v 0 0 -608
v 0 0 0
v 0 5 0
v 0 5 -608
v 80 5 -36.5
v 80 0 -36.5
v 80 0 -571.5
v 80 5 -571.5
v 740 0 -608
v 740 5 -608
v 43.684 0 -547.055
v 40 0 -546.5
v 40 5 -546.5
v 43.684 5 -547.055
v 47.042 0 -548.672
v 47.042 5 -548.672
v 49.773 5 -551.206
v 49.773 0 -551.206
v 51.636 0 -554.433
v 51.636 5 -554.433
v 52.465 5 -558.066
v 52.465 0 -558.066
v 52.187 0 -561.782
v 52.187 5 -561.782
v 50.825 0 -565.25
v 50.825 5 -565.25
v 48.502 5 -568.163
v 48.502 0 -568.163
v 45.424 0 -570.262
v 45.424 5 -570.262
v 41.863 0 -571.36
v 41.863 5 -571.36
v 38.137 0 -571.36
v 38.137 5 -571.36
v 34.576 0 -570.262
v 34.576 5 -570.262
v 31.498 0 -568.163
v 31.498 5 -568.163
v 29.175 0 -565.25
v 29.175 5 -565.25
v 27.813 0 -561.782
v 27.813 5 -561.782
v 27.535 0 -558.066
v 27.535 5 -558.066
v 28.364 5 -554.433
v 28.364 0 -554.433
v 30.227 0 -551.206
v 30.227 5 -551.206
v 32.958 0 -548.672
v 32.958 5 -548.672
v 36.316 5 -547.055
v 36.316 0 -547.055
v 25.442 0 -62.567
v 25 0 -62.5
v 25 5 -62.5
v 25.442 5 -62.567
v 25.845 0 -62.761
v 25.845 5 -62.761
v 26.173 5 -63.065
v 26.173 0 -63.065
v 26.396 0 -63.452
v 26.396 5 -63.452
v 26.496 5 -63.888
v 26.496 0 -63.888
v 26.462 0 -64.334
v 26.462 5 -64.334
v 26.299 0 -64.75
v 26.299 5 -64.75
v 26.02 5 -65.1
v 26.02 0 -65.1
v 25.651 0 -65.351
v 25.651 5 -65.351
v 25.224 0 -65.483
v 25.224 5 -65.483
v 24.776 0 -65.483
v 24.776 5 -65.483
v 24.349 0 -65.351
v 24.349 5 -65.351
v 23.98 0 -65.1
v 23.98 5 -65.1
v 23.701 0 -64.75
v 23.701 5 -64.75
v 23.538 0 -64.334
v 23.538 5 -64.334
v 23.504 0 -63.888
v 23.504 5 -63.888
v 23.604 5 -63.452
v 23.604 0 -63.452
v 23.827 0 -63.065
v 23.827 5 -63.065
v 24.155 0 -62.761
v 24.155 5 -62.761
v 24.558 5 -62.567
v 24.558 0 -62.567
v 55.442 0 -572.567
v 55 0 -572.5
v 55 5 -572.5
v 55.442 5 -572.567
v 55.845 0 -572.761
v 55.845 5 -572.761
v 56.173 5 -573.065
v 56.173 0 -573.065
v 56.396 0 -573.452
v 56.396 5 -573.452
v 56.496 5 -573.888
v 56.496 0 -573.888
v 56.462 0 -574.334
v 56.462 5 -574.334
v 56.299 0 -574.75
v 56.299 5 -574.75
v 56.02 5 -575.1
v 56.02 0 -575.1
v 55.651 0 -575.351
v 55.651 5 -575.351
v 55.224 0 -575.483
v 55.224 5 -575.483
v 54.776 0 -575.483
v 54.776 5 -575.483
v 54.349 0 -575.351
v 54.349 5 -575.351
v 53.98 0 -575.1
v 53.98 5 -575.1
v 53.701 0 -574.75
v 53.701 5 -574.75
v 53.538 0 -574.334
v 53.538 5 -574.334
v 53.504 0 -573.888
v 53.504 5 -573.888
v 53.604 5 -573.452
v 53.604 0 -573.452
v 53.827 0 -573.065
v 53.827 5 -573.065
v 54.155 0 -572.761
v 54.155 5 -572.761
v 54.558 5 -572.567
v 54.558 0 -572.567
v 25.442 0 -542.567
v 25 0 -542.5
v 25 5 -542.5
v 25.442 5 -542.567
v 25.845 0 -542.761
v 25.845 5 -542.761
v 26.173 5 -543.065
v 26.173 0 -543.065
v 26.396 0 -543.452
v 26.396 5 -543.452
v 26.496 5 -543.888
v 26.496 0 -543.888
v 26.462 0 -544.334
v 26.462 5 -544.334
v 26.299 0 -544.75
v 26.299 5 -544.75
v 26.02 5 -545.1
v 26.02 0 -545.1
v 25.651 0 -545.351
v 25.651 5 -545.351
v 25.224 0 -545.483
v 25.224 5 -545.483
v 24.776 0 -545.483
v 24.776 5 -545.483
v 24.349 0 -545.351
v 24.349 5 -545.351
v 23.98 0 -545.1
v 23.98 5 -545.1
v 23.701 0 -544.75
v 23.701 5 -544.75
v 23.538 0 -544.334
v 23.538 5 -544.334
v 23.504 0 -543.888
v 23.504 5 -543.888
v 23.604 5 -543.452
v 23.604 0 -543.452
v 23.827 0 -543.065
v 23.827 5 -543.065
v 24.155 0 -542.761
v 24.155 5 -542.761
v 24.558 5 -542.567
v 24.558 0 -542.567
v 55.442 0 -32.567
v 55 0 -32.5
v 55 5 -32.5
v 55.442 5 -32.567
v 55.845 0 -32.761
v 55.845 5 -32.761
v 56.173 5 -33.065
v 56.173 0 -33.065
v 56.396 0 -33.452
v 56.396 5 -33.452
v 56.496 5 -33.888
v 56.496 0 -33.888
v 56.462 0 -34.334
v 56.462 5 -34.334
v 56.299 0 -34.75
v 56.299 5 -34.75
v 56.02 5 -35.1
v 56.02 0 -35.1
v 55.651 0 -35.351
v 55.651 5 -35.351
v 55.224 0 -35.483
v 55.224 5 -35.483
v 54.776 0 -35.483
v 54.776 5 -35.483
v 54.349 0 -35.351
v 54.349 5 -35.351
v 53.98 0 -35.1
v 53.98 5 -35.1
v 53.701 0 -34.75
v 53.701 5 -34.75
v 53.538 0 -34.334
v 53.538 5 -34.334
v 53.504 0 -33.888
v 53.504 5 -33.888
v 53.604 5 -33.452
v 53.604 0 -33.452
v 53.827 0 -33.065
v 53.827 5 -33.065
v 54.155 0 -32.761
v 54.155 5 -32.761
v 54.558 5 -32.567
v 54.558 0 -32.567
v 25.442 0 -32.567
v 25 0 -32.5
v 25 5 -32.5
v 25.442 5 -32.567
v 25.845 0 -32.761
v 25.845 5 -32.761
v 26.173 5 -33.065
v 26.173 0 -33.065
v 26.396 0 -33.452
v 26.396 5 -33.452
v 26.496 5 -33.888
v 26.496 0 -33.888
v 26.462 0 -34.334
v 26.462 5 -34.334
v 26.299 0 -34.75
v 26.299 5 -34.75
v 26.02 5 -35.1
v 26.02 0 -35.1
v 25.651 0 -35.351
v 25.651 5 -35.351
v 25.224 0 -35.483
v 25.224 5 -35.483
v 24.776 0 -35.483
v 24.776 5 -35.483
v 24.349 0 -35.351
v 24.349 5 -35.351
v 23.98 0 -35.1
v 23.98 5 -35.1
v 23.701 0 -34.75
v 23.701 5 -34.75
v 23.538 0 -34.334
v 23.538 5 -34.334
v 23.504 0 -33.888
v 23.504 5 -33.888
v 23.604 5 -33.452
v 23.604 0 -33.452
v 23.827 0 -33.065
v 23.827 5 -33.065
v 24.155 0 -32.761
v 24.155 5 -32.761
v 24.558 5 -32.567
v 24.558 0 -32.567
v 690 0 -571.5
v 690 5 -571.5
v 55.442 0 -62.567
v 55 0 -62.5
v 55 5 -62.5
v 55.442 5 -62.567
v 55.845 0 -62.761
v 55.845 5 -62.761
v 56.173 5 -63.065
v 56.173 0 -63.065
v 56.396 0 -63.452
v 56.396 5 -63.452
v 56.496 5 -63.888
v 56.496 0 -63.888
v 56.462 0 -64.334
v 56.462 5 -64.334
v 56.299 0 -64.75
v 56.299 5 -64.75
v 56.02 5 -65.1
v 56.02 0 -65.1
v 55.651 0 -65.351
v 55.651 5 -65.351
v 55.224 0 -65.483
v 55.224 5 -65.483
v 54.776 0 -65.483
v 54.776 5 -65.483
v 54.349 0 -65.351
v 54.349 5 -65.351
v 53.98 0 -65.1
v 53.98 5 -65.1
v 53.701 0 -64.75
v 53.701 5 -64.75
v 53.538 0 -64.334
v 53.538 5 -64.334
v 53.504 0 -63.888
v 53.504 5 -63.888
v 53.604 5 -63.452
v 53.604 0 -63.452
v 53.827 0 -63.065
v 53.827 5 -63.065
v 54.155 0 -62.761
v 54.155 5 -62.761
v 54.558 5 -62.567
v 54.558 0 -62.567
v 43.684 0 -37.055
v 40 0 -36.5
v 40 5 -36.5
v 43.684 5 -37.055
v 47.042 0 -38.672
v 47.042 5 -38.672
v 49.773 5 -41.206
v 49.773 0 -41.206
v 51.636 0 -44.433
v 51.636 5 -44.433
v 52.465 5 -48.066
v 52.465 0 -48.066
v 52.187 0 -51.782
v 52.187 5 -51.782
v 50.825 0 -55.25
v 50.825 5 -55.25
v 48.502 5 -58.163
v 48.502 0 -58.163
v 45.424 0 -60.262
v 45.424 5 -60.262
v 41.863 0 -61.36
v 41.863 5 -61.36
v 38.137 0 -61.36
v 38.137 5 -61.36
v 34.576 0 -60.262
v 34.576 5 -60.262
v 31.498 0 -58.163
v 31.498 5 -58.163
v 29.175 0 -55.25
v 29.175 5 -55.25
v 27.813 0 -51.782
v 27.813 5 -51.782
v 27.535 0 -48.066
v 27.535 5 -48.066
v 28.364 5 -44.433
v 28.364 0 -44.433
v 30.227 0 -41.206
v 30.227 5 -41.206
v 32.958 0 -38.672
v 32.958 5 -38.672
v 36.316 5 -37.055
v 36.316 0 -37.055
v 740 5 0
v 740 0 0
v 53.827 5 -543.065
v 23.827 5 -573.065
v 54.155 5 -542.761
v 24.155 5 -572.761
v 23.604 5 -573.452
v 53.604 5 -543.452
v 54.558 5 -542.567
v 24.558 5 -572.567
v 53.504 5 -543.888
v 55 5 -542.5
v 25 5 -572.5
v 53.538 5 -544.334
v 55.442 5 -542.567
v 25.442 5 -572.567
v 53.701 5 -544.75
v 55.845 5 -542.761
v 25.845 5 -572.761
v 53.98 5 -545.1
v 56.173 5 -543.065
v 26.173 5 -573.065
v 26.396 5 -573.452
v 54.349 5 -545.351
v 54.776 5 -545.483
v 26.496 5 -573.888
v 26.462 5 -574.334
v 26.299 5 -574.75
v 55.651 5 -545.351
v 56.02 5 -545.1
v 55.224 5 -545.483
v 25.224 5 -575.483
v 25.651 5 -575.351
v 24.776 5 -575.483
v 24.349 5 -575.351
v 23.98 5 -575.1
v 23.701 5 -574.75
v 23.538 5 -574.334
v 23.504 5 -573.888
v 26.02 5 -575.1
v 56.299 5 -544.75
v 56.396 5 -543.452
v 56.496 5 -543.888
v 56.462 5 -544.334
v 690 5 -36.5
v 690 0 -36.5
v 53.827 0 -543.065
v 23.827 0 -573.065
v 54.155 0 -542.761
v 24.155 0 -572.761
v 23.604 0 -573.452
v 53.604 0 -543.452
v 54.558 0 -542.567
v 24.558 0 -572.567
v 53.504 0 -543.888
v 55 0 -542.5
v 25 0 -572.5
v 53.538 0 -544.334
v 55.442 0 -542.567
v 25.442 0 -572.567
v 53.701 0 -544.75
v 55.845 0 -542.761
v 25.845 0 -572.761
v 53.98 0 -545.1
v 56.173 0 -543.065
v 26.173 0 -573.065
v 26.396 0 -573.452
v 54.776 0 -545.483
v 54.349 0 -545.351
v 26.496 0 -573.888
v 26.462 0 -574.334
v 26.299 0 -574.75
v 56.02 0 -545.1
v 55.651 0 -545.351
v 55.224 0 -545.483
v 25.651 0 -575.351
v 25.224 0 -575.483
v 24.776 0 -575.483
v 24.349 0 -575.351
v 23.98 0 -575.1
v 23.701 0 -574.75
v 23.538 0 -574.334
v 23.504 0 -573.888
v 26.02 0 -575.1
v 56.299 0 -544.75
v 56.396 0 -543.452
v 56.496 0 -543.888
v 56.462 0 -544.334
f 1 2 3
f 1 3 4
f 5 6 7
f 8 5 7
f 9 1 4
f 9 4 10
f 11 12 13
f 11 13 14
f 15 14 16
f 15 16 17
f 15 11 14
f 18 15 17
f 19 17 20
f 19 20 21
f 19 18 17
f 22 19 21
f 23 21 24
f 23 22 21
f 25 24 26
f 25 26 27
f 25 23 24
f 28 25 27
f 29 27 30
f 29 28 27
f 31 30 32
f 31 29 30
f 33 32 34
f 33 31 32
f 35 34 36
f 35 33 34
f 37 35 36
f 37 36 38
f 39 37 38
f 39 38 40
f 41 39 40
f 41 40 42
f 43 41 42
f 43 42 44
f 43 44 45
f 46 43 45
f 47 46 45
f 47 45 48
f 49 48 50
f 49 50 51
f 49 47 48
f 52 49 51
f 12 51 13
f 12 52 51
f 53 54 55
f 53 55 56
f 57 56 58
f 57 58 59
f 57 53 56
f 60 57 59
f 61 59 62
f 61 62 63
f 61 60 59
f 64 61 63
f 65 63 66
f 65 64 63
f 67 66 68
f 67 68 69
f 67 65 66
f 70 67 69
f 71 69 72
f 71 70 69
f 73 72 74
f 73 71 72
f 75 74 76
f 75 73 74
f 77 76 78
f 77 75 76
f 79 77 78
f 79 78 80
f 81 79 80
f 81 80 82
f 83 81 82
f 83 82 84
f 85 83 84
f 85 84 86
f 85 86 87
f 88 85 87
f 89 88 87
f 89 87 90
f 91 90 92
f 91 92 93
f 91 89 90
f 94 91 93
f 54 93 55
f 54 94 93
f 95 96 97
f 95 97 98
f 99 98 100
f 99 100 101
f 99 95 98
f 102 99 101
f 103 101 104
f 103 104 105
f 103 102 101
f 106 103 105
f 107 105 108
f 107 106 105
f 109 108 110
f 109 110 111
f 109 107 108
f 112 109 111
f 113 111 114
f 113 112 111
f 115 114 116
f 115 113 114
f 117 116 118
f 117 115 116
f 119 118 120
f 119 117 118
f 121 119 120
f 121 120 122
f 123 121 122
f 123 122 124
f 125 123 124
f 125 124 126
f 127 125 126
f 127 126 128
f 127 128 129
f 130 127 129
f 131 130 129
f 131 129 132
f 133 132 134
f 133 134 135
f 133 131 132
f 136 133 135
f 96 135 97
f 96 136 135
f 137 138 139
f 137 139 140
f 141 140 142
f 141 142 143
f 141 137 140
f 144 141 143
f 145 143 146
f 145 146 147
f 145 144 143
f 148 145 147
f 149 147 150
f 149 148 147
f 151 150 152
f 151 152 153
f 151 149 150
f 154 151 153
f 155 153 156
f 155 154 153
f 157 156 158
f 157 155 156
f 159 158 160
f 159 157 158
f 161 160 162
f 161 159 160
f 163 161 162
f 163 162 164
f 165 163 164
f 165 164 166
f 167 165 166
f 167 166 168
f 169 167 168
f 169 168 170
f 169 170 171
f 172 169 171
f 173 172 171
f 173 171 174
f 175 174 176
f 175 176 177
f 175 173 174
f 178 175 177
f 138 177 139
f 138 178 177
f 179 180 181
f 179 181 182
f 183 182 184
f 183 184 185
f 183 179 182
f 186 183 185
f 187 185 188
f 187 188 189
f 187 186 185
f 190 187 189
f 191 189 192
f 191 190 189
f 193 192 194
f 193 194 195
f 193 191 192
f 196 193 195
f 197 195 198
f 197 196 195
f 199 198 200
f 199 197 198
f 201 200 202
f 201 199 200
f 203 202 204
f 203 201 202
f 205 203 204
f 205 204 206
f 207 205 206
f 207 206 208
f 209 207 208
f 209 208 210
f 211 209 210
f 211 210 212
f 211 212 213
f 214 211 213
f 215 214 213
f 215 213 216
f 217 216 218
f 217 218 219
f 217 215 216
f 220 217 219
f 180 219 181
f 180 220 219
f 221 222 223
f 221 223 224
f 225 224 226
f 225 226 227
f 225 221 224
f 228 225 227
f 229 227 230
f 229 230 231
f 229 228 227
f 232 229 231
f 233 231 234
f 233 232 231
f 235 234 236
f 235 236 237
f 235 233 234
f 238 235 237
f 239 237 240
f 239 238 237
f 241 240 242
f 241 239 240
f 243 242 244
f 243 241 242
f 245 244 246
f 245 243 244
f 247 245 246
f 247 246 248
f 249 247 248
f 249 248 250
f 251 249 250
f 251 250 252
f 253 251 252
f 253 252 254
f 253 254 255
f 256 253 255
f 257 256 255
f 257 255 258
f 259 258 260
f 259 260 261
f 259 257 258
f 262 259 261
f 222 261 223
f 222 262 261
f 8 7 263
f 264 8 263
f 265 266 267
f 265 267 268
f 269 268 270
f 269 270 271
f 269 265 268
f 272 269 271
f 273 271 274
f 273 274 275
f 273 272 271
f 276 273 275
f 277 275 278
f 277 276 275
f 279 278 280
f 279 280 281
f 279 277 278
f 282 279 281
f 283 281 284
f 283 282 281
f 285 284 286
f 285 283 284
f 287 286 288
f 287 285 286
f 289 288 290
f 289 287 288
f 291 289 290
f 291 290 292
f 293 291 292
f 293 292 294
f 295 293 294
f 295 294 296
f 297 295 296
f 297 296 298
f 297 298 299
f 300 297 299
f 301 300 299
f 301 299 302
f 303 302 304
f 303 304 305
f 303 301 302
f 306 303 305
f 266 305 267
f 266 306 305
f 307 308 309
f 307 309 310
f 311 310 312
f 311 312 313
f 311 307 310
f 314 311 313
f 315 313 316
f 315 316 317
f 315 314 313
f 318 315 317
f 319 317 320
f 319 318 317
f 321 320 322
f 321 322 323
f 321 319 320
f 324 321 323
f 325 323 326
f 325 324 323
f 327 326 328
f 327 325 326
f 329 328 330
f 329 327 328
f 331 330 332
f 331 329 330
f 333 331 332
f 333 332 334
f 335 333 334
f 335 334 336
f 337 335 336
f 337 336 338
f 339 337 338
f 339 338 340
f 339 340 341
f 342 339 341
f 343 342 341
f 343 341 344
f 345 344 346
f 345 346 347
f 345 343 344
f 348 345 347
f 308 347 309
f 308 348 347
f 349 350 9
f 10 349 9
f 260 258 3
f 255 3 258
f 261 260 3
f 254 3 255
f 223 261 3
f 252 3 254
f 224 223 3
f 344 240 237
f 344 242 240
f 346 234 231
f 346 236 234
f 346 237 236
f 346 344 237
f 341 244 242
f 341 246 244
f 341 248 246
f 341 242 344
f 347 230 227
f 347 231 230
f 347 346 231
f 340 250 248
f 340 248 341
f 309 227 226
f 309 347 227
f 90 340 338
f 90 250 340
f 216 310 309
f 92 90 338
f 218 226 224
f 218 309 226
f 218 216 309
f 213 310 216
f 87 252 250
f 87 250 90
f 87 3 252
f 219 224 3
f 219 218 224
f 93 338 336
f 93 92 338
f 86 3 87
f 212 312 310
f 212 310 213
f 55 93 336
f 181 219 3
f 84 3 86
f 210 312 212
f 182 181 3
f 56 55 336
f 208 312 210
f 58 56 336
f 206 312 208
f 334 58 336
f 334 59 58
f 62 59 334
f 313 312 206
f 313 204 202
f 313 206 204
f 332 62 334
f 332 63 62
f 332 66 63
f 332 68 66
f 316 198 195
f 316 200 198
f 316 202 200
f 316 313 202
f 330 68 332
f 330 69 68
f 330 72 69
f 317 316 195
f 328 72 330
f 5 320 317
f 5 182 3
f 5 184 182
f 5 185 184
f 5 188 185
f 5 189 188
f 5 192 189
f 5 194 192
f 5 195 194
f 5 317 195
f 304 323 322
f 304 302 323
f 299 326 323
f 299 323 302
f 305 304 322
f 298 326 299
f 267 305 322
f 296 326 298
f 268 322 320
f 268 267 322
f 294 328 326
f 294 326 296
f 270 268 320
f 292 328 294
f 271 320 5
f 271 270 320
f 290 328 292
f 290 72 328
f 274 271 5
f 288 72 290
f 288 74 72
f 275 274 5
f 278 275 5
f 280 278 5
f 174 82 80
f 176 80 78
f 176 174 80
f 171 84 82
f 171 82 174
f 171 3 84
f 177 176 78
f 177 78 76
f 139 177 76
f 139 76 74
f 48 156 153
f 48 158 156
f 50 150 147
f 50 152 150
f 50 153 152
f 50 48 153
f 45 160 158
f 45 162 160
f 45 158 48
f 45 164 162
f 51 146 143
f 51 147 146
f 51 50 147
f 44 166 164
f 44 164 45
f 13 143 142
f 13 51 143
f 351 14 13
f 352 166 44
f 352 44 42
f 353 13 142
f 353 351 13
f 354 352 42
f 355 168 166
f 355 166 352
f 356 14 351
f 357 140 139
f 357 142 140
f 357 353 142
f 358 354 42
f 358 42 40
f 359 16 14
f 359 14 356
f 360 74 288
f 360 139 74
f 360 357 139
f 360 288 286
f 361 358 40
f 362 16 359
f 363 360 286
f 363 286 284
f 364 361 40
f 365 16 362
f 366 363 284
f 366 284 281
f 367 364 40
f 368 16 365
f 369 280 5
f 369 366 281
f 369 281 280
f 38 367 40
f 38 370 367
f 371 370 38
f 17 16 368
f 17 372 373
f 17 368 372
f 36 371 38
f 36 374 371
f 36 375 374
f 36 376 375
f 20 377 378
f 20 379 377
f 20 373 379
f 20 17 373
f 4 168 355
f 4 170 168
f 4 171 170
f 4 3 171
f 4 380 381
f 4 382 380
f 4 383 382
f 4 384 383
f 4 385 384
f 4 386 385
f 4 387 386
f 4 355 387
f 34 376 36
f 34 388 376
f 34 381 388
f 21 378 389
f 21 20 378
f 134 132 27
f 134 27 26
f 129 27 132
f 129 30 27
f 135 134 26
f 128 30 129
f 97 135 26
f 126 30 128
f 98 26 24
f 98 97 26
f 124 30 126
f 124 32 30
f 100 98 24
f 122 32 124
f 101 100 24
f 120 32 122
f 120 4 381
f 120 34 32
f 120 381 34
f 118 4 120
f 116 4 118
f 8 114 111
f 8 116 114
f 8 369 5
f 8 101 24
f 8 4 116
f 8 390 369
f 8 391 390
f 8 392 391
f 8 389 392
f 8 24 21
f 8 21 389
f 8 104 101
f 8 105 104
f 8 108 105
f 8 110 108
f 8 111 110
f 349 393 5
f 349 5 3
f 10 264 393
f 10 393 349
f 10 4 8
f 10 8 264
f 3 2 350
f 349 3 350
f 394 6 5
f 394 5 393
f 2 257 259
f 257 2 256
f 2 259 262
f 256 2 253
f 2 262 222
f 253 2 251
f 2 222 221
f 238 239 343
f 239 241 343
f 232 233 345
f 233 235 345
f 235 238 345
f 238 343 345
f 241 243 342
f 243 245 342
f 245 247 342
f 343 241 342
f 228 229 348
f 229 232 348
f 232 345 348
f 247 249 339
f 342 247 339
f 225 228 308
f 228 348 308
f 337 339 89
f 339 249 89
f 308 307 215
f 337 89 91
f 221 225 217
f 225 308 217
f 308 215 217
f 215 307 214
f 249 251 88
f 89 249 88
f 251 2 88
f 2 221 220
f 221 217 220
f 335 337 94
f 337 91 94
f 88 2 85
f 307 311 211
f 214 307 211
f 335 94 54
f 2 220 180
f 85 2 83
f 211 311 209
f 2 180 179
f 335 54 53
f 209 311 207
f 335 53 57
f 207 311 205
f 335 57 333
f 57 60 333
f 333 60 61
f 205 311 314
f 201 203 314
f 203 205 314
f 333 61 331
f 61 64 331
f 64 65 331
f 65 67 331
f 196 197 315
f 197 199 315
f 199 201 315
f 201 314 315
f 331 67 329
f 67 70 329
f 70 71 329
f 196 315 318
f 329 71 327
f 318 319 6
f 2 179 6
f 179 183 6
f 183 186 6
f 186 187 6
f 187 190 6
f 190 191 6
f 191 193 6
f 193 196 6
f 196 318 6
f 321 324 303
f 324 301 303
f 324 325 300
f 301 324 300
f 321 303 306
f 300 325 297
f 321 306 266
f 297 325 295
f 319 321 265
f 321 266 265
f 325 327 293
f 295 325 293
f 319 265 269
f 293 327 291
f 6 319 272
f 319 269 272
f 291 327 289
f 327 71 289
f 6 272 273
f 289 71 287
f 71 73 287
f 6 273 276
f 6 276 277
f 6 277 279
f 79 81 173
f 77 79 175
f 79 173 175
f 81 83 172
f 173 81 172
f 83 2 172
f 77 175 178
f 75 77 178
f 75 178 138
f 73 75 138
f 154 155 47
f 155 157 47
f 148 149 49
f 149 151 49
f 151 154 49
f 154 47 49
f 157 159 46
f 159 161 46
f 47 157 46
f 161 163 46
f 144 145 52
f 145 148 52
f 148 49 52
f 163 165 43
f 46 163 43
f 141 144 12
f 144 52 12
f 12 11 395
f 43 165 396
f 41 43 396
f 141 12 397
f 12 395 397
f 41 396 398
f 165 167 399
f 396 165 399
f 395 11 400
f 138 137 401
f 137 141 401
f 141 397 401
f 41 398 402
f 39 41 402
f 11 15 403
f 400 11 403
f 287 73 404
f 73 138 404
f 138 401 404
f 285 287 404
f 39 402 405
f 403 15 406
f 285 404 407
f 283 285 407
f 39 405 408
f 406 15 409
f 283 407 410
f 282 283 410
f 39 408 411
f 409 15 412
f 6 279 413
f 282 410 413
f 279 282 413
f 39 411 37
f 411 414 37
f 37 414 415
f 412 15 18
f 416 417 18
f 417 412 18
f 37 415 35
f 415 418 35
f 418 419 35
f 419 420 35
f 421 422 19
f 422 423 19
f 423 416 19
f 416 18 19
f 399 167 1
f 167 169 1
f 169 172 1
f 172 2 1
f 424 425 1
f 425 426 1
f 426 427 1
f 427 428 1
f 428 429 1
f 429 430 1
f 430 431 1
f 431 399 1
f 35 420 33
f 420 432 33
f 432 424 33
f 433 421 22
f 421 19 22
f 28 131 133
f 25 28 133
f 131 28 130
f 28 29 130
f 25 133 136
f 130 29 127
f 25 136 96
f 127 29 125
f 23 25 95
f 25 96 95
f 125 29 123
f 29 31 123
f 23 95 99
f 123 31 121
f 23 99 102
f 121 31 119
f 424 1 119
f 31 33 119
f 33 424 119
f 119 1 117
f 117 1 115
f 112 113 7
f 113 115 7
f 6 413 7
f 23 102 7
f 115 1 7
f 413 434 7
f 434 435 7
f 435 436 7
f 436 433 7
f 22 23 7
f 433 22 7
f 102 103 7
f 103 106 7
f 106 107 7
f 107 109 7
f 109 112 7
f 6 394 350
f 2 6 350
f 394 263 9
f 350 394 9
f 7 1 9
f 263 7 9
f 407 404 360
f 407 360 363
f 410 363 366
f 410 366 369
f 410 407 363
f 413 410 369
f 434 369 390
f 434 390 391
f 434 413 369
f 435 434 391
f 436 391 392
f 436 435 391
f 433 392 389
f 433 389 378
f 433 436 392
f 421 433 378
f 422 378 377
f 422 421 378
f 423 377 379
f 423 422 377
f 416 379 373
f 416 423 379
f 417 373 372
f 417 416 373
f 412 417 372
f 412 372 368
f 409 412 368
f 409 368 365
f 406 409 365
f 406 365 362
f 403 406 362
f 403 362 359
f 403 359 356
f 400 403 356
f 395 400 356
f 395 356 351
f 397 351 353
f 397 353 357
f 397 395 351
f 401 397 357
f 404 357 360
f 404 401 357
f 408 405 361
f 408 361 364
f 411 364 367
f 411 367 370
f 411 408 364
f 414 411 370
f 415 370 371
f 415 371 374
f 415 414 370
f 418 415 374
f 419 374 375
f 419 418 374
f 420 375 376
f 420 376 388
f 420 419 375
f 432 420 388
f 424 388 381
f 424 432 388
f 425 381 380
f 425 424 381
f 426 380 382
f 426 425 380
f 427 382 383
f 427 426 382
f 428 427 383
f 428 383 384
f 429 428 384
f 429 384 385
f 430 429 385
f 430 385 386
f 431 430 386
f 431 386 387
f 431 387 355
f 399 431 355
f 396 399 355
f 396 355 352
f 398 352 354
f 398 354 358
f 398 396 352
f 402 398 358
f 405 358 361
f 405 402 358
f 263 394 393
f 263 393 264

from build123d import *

# Parameters (mm, degrees)
SKETCH1_W           = 740
SKETCH1_H           = 608
SKETCH1_R           = 12.5
SKETCH1_R_2         = 1.5
SKETCH1_W_2         = 610
SKETCH1_H_2         = 535
BOSS_EXTRUDE1_DEPTH = 5


with BuildPart() as part:
    # Sketch1 → Boss-Extrude1 (new body)
    with BuildSketch(Plane(origin=(0, 0, 0), x_dir=(1, 0, 0), z_dir=(0, 1, 0))):
        with Locations((370, 304)):
            Rectangle(SKETCH1_W, SKETCH1_H)
        with Locations(Location((40, 559, 0), (0, 0, 270))):
            Circle(SKETCH1_R, mode=Mode.SUBTRACT)
        with Locations(Location((40, 49, 0), (0, 0, 270))):
            Circle(SKETCH1_R, mode=Mode.SUBTRACT)
        with Locations(Location((25, 64, 0), (0, 0, 270))):
            Circle(SKETCH1_R_2, mode=Mode.SUBTRACT)
        with Locations(Location((25, 34, 0), (0, 0, 270))):
            Circle(SKETCH1_R_2, mode=Mode.SUBTRACT)
        with Locations(Location((55, 34, 0), (0, 0, 270))):
            Circle(SKETCH1_R_2, mode=Mode.SUBTRACT)
        with Locations(Location((55, 64, 0), (0, 0, 270))):
            Circle(SKETCH1_R_2, mode=Mode.SUBTRACT)
        with Locations(Location((25, 574, 0), (0, 0, 270))):
            Circle(SKETCH1_R_2, mode=Mode.SUBTRACT)
        with Locations(Location((55, 574, 0), (0, 0, 270))):
            Circle(SKETCH1_R_2, mode=Mode.SUBTRACT)
        with Locations(Location((55, 544, 0), (0, 0, 270))):
            Circle(SKETCH1_R_2, mode=Mode.SUBTRACT)
        with Locations(Location((25, 544, 0), (0, 0, 270))):
            Circle(SKETCH1_R_2, mode=Mode.SUBTRACT)
        with Locations((385, 304)):
            Rectangle(SKETCH1_W_2, SKETCH1_H_2, mode=Mode.SUBTRACT)
    extrude(amount=BOSS_EXTRUDE1_DEPTH)


solid = part.part
